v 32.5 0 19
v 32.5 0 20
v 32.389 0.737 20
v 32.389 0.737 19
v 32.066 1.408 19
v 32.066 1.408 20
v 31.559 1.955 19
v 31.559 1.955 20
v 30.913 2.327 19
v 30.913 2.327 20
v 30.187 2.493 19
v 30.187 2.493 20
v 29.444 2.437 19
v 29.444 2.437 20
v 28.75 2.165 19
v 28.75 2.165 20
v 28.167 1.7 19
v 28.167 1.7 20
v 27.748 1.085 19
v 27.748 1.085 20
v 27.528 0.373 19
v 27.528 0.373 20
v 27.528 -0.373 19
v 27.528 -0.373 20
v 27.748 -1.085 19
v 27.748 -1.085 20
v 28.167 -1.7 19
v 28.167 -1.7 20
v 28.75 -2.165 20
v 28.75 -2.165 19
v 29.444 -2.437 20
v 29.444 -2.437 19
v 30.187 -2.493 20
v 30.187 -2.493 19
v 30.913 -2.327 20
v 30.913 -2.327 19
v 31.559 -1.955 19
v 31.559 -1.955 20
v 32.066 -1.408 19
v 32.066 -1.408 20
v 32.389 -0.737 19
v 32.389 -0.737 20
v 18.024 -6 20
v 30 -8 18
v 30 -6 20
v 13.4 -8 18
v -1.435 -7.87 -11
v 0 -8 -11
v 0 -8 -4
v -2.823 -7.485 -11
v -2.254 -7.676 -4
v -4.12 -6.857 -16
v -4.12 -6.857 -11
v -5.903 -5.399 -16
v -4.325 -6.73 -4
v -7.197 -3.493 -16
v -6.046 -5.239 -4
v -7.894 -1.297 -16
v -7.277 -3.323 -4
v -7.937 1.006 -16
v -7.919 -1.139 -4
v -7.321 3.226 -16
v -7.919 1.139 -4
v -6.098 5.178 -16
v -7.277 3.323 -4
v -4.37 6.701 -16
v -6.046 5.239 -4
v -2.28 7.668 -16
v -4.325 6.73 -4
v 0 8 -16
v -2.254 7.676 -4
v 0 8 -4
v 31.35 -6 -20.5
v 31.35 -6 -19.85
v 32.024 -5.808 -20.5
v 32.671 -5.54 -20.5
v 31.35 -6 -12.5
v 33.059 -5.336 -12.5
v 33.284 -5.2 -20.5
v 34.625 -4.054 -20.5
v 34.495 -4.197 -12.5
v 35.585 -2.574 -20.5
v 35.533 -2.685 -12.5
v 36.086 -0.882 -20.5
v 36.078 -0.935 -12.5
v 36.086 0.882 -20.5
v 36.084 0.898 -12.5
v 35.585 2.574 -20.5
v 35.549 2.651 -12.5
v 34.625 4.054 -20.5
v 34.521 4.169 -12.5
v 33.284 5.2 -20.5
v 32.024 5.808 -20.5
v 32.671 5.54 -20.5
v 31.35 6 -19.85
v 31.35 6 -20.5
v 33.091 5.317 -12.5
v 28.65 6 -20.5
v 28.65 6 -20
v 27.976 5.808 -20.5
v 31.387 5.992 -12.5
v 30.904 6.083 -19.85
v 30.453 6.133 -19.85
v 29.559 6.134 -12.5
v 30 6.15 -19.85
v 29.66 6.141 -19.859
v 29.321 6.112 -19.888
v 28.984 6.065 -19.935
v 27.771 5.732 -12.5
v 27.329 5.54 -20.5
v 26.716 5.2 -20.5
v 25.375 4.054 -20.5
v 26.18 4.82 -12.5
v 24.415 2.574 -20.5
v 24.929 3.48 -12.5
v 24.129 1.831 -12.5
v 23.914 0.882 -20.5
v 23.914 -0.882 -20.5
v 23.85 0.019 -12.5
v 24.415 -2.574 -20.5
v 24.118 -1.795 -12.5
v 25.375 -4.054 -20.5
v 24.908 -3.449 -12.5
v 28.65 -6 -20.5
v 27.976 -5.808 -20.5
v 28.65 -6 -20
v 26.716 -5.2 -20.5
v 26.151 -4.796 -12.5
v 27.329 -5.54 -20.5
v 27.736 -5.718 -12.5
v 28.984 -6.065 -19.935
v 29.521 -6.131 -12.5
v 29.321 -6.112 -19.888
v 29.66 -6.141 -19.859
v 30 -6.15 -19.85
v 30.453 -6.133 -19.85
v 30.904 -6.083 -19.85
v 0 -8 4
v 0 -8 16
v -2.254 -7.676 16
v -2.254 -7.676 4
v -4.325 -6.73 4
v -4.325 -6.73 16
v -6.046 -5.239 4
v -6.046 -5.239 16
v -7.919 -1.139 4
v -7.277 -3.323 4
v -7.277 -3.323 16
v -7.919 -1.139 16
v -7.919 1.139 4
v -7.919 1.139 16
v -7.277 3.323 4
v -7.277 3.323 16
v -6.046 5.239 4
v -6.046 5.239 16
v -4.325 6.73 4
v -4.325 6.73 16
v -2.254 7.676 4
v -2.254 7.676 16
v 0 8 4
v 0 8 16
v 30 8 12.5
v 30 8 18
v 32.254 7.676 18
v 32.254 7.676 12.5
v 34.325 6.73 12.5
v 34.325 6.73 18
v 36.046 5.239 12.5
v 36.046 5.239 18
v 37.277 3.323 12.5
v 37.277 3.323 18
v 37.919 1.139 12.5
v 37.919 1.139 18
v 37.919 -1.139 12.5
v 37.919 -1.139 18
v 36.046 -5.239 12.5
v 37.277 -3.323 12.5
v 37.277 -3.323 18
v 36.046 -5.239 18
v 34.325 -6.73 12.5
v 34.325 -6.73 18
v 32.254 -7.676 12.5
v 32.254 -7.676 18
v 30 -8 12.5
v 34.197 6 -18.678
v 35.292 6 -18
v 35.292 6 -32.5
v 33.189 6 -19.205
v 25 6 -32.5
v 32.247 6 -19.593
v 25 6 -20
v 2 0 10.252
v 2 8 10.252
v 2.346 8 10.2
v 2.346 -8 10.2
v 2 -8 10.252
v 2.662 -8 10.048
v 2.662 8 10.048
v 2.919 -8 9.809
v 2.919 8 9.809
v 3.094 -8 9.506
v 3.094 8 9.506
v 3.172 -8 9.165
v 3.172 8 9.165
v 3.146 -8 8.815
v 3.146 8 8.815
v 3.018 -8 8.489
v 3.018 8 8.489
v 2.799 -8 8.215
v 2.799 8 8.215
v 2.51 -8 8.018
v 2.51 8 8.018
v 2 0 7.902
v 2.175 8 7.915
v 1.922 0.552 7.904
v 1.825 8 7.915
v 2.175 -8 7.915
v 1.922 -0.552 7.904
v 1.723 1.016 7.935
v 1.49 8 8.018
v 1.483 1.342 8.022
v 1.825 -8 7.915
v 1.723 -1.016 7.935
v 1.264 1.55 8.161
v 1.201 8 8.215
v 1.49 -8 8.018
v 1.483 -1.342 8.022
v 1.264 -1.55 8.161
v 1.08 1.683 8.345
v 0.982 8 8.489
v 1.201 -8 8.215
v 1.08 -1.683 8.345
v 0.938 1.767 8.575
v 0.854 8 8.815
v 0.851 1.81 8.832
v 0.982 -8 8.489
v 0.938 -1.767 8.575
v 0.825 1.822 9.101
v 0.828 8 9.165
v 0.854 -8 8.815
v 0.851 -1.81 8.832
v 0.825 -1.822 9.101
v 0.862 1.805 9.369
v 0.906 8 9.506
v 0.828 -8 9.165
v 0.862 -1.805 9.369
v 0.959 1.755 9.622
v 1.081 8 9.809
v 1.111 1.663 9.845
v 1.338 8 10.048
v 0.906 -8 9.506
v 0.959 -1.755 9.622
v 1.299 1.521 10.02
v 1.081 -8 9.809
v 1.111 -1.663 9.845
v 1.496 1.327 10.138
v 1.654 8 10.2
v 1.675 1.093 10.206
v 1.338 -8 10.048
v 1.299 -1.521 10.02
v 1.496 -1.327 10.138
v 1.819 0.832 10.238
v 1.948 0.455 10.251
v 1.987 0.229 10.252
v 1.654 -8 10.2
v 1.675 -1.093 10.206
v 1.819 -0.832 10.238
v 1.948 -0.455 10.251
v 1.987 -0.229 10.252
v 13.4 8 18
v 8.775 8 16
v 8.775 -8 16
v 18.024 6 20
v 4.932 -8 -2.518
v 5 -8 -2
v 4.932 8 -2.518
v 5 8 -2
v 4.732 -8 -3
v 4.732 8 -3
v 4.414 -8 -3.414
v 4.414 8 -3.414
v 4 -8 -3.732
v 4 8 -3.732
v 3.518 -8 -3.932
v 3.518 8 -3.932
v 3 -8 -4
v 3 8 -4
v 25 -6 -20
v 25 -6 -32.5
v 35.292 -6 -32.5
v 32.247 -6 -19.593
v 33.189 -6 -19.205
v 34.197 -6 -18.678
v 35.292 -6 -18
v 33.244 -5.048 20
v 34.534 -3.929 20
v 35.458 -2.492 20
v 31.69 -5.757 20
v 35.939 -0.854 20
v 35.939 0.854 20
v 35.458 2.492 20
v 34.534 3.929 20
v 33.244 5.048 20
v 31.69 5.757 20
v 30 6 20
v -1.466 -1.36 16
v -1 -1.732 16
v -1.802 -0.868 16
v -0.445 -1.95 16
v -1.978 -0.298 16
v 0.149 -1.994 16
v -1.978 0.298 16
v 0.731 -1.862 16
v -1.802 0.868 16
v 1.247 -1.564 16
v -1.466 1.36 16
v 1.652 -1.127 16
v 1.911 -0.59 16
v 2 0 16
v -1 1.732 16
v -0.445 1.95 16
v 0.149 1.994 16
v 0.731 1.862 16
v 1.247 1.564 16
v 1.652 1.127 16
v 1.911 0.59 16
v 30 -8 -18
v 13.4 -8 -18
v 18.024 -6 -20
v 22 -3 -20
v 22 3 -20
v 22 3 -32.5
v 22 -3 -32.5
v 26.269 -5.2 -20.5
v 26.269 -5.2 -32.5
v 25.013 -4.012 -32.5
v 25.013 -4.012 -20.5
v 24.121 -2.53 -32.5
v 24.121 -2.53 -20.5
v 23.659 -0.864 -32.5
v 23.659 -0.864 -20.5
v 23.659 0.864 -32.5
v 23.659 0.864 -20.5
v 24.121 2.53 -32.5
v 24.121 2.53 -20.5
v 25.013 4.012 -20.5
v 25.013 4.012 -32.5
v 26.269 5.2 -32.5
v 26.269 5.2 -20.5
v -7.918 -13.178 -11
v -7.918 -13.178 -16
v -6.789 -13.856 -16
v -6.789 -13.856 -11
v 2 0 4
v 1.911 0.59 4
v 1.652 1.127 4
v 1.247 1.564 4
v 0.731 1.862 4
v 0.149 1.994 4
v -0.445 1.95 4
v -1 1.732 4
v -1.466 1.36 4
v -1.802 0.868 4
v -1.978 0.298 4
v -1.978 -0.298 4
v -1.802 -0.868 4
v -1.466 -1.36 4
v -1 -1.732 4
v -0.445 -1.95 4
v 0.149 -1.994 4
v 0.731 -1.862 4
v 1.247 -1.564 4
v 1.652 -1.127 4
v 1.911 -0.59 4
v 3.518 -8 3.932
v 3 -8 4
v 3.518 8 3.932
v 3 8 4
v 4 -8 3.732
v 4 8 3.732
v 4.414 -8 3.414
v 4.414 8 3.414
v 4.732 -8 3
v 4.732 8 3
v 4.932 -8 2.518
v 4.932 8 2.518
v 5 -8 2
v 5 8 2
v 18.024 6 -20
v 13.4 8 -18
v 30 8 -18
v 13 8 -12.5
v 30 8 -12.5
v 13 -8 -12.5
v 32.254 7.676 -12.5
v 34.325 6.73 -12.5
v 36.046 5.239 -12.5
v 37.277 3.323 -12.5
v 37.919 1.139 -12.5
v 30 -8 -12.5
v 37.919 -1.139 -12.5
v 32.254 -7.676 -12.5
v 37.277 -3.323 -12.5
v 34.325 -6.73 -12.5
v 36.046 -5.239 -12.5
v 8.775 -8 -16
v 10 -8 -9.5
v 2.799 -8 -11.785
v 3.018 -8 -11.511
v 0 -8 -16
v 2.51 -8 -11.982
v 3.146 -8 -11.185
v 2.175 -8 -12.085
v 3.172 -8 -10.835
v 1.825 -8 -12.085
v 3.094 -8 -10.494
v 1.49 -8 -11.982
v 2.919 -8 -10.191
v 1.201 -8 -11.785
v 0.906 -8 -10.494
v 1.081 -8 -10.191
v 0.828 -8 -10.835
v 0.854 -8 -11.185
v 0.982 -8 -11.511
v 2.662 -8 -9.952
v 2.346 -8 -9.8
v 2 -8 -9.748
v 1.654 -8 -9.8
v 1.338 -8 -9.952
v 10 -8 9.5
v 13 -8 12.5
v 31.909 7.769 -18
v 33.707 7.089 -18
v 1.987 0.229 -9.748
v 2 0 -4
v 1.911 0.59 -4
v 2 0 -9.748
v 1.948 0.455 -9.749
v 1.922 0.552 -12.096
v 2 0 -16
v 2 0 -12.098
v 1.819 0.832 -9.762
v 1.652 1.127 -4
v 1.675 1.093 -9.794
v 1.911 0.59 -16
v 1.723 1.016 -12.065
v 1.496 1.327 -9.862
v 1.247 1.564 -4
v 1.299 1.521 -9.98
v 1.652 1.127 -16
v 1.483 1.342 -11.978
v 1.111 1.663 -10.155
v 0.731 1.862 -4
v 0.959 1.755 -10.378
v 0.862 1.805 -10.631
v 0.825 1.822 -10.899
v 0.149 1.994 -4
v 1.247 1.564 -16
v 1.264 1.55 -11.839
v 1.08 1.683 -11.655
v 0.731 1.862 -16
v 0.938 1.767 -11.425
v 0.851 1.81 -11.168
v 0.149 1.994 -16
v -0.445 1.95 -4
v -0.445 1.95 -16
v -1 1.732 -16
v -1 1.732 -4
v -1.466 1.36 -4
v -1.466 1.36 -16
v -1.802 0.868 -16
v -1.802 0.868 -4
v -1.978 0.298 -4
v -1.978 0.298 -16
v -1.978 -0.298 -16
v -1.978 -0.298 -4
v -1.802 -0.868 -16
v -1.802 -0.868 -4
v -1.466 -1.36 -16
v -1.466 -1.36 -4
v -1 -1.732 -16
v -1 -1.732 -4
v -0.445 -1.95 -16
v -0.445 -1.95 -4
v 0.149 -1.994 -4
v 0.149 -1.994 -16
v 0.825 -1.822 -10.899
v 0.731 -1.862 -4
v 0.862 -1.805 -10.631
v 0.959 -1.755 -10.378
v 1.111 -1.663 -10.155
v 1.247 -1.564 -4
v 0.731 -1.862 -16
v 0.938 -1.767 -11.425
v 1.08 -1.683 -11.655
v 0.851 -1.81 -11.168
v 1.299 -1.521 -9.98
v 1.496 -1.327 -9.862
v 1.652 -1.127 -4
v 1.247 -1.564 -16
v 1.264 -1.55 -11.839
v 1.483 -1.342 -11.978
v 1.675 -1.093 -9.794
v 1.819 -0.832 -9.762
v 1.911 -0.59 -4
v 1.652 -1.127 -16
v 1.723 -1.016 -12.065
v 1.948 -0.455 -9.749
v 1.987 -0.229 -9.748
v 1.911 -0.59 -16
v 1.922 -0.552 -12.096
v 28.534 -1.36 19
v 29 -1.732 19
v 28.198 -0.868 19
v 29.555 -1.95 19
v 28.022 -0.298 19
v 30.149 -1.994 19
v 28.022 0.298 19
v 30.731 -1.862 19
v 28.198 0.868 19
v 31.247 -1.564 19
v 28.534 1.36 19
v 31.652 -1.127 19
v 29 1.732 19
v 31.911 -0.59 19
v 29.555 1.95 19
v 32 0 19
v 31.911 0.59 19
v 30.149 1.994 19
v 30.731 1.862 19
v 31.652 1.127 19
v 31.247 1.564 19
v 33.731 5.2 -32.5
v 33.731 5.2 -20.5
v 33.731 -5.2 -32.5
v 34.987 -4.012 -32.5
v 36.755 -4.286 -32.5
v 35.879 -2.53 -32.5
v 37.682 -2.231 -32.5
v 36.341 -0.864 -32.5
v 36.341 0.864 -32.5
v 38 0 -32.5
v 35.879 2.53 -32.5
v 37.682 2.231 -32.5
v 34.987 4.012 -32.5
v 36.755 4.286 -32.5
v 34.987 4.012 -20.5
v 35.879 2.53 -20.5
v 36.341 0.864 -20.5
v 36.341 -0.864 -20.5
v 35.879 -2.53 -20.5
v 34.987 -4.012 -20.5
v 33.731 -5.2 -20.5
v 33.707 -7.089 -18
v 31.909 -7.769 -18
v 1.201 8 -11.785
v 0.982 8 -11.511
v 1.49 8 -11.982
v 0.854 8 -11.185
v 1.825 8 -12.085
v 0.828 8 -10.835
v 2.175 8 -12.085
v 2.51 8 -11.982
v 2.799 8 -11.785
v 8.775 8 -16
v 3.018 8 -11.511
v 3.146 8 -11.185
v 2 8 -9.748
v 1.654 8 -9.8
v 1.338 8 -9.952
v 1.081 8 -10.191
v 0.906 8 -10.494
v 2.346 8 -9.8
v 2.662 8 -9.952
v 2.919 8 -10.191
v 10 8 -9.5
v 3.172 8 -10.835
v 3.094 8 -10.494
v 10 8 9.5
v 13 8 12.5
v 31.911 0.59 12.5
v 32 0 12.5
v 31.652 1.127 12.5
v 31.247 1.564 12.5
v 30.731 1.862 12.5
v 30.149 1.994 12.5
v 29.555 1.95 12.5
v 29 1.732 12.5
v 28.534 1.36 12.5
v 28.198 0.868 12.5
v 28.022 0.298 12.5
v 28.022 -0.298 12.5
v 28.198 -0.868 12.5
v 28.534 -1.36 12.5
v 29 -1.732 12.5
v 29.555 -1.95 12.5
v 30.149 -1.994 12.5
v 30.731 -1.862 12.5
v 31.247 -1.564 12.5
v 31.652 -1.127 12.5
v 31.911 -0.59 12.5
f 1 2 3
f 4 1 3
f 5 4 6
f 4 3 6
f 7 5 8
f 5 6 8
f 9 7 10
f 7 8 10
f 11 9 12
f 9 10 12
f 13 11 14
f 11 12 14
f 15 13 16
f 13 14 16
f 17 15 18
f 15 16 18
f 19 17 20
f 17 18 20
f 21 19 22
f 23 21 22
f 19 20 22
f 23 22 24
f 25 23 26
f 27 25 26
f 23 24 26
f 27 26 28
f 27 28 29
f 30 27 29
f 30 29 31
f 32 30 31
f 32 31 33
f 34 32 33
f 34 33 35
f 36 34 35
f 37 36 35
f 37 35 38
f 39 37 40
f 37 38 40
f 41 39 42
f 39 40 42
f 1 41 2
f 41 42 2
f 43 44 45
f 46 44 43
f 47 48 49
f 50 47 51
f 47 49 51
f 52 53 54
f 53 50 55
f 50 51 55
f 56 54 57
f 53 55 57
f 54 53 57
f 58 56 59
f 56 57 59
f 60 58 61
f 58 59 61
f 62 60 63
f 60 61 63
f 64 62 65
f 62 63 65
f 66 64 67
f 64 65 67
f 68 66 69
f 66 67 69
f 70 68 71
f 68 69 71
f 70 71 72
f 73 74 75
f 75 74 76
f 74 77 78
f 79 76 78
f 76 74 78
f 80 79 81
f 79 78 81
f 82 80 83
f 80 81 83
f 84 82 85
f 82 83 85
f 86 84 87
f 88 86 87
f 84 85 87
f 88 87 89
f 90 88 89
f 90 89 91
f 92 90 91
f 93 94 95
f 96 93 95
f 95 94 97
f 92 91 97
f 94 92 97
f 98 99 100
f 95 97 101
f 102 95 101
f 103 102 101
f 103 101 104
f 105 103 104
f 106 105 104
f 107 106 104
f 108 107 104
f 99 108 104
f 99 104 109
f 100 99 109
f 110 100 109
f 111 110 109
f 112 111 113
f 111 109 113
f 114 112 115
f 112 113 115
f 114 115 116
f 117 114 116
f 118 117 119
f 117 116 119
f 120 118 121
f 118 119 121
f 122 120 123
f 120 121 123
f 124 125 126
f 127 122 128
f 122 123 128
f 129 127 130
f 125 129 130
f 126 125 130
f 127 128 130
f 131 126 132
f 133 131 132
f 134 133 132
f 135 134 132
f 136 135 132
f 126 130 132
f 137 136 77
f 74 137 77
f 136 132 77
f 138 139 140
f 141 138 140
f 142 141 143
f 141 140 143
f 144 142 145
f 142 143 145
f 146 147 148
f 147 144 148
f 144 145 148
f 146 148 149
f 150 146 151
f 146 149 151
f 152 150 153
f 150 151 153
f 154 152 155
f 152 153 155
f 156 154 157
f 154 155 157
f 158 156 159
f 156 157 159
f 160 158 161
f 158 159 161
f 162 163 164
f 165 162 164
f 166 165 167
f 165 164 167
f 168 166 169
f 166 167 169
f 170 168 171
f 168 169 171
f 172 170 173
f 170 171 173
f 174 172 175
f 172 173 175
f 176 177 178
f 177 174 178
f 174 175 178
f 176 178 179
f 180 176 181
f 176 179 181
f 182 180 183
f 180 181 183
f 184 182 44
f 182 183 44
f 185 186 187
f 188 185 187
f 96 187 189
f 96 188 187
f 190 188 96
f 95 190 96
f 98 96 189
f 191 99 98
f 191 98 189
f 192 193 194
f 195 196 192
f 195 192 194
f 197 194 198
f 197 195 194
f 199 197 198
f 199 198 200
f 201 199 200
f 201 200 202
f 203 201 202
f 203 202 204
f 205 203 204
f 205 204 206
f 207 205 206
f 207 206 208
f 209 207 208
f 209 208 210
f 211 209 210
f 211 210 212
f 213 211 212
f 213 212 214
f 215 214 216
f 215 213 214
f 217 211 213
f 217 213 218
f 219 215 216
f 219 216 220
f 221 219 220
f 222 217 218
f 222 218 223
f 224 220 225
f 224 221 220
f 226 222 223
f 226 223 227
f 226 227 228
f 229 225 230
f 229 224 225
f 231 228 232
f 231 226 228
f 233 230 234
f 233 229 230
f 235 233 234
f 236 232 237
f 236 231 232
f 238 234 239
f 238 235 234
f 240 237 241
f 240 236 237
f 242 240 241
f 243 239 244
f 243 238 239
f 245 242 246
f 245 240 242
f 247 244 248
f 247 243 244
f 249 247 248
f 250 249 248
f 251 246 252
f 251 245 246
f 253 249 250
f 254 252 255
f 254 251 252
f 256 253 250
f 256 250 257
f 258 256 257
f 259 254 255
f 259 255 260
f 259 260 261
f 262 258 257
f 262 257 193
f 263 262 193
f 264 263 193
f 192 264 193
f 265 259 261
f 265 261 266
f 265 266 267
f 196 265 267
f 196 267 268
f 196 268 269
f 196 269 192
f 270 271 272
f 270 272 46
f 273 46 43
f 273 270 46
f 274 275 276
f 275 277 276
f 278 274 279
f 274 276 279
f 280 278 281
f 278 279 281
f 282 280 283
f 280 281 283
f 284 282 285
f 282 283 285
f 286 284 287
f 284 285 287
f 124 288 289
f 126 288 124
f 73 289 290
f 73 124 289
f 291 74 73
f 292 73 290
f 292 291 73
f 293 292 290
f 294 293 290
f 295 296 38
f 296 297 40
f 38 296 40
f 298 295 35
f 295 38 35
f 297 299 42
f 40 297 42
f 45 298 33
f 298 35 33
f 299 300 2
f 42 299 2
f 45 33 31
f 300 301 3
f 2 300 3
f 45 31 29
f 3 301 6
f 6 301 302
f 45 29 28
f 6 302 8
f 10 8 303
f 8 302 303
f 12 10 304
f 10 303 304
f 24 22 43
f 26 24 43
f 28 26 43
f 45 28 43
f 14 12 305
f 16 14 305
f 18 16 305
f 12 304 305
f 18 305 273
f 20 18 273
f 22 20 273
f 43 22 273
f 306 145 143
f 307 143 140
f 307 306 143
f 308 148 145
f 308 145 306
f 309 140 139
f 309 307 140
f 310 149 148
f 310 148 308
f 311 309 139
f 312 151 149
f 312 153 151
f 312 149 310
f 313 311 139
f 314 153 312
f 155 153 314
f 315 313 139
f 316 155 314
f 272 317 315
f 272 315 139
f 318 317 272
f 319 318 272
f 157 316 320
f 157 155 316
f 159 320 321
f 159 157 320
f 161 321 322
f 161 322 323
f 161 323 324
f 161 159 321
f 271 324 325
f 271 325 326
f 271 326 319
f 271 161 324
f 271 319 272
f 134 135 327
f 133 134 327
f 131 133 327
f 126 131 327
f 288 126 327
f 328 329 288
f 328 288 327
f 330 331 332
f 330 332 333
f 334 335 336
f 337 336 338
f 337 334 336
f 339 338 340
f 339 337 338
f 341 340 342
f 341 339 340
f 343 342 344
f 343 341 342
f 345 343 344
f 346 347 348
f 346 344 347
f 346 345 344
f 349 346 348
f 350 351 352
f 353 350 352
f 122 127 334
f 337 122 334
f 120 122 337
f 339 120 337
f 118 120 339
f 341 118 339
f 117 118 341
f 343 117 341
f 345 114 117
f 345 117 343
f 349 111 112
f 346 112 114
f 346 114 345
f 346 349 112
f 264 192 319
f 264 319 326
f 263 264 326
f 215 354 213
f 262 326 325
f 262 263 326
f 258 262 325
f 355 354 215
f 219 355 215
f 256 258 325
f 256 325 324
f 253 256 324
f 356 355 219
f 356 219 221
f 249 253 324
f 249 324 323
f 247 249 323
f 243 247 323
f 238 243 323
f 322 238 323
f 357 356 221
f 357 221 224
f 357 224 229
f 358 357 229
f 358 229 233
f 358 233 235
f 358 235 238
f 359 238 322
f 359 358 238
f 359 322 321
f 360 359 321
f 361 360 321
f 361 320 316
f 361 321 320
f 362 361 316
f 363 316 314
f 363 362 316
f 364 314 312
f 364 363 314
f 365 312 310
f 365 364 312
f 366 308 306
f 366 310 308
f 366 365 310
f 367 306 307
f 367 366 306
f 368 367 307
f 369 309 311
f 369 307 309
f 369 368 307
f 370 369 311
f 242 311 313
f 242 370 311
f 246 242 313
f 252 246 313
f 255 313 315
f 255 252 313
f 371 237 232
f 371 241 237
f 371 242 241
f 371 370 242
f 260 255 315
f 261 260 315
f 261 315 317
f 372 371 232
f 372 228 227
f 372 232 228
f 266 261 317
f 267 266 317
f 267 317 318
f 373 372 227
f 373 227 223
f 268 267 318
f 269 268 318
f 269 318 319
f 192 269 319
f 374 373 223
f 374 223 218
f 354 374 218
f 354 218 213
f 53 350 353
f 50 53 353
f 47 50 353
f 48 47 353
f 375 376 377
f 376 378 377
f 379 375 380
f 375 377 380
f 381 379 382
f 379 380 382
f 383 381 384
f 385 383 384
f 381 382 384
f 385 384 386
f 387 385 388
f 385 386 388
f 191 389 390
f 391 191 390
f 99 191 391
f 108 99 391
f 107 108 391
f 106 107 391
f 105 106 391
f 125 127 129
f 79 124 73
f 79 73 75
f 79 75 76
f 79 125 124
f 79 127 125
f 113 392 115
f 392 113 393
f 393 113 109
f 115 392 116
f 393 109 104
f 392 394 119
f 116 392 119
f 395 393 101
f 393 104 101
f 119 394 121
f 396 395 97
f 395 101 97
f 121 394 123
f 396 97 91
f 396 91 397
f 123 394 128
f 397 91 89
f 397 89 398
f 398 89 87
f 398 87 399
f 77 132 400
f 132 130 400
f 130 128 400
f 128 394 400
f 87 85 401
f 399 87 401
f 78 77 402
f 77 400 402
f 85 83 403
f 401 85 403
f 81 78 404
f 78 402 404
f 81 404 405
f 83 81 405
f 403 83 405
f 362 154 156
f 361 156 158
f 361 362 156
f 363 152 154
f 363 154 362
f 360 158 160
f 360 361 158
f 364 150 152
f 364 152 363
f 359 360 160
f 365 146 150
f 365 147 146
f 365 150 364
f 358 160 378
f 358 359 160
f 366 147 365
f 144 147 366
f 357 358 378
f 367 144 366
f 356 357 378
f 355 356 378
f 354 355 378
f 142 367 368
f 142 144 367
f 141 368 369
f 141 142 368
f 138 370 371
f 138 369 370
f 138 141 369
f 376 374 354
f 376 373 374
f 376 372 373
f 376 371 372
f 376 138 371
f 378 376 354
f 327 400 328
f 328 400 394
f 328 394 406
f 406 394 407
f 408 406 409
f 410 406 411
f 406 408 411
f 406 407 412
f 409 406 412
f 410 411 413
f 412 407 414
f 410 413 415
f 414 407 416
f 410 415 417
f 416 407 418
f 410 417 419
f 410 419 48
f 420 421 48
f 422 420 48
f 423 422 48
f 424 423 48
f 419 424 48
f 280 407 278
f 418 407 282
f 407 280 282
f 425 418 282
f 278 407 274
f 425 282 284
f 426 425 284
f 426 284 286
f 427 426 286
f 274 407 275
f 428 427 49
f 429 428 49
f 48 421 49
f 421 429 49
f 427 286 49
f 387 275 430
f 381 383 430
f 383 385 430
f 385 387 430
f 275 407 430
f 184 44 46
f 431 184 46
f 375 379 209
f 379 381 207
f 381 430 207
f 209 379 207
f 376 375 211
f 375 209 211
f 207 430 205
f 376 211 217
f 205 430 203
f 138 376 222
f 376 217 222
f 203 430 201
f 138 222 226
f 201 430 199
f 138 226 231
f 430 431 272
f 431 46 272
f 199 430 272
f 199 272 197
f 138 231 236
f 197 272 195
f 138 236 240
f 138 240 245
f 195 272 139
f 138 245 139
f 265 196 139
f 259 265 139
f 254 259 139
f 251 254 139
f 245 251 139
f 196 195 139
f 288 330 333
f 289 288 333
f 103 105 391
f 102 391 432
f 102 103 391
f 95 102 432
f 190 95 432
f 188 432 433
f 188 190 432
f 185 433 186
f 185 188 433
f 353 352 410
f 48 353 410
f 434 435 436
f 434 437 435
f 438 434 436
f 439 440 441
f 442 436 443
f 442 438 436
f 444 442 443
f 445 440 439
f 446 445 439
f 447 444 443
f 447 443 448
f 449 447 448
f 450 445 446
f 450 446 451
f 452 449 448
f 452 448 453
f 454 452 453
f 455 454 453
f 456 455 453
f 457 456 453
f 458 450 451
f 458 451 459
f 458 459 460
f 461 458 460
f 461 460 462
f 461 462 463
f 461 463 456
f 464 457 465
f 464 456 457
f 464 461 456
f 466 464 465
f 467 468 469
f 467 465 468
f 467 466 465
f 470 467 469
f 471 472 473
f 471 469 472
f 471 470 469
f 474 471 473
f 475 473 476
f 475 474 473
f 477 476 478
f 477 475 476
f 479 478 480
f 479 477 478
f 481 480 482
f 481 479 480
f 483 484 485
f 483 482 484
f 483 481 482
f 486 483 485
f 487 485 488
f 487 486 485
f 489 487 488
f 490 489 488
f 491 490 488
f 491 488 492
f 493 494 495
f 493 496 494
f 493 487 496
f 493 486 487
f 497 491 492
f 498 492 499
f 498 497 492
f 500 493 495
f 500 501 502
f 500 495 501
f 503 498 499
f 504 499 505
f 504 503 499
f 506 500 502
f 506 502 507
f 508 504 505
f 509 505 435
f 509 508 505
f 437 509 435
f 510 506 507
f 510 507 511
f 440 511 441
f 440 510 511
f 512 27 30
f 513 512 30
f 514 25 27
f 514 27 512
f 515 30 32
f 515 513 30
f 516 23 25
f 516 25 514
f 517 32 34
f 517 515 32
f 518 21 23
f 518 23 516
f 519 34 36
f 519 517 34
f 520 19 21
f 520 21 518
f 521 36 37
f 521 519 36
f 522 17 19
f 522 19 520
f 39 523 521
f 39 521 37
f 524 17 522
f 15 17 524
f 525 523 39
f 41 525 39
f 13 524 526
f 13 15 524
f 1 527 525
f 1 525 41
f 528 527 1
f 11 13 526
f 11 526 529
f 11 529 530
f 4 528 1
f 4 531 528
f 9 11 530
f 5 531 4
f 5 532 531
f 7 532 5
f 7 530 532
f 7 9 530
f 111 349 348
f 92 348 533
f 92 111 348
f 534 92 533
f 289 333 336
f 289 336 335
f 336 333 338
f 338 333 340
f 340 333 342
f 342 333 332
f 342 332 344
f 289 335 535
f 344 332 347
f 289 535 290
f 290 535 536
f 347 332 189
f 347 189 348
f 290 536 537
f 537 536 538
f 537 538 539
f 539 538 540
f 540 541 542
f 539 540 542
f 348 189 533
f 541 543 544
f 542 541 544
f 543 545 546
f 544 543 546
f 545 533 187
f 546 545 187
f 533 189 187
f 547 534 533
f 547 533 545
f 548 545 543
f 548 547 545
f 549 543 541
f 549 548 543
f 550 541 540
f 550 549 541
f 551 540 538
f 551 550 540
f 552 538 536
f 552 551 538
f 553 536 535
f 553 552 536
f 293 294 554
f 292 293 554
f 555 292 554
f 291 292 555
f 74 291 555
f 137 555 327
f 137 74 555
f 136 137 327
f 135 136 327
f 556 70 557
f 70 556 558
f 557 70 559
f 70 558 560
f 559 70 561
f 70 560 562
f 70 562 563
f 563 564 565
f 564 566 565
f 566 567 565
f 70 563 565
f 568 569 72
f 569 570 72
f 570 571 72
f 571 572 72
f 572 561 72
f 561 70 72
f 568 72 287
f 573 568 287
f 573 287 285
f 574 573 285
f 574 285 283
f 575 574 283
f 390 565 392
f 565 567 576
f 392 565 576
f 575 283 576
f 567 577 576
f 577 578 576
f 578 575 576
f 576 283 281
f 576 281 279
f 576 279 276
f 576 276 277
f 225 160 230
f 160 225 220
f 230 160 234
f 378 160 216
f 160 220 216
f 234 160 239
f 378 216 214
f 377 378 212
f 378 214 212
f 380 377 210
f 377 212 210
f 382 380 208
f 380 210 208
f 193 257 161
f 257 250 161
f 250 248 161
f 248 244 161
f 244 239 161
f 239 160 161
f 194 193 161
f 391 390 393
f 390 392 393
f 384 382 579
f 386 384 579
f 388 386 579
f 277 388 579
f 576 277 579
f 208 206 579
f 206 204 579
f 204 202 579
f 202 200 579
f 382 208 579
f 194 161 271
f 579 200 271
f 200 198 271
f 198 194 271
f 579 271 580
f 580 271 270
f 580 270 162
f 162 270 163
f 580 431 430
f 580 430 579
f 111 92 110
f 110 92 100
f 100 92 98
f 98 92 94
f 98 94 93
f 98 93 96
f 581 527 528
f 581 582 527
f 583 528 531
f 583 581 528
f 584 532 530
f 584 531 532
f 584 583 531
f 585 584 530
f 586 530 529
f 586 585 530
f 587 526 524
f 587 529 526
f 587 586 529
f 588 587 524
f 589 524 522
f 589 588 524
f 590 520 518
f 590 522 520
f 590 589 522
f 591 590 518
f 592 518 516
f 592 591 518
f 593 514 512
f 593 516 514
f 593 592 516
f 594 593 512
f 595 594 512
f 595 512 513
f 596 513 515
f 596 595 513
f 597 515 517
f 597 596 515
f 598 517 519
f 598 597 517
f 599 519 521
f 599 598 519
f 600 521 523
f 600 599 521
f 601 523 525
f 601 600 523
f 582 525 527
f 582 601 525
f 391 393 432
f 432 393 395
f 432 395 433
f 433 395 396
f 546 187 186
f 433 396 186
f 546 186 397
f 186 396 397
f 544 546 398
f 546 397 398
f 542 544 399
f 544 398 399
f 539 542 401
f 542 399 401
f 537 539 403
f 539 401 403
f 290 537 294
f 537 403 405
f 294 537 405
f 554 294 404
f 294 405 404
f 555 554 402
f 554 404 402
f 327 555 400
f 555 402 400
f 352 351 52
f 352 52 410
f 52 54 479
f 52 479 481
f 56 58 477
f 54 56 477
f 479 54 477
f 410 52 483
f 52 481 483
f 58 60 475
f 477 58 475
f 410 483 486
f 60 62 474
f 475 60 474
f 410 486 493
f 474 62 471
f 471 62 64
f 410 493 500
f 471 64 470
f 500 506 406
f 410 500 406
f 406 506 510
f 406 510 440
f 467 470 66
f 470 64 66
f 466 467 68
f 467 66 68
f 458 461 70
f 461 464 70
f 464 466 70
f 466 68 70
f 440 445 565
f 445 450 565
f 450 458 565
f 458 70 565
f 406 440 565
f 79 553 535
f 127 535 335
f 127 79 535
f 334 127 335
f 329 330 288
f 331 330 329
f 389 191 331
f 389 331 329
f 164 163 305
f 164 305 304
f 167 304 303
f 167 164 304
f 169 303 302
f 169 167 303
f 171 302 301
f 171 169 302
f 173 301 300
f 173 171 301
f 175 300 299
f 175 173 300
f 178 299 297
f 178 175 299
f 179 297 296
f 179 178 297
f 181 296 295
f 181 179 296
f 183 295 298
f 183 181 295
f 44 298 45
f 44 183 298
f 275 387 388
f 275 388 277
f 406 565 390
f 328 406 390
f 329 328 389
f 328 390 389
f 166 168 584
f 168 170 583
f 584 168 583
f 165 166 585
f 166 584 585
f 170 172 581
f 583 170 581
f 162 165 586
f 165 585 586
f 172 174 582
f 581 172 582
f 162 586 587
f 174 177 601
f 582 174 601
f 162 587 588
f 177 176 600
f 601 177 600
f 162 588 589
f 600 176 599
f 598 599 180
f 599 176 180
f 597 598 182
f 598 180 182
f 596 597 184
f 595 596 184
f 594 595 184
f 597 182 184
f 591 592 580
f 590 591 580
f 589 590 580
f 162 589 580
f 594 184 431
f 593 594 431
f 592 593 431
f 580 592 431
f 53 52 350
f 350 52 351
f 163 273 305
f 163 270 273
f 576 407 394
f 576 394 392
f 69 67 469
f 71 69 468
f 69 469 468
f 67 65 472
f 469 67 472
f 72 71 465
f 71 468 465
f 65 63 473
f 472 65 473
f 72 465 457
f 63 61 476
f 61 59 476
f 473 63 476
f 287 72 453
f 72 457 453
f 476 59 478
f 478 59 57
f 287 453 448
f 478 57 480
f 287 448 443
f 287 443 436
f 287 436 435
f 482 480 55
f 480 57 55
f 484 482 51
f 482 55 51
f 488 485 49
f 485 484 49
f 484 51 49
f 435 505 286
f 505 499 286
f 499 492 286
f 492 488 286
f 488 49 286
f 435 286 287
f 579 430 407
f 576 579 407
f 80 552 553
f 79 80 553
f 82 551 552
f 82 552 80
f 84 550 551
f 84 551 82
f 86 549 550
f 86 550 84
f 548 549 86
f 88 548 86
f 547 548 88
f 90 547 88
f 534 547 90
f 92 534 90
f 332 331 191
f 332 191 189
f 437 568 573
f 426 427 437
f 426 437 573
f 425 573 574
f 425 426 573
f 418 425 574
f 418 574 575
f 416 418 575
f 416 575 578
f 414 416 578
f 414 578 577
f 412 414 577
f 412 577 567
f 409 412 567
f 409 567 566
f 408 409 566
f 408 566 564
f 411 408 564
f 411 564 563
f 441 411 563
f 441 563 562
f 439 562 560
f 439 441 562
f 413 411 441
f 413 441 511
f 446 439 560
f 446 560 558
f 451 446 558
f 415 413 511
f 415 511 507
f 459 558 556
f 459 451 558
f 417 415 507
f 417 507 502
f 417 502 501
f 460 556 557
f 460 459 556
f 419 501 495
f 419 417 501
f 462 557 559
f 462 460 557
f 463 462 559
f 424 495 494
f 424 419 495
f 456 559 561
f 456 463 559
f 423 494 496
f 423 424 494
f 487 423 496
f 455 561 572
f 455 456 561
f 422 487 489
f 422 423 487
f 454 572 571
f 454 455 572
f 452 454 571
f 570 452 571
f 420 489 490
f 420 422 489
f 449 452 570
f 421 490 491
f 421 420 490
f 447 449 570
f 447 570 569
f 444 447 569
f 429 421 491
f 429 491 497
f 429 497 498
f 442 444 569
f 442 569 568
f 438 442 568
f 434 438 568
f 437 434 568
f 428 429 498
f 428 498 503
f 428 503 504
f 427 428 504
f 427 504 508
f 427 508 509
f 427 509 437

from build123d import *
from build123d.topology import SkipClean

# Parameters (mm, degrees)
CROQUIS1_R                 = 2
CROQUIS1_R_2               = 2.000000000000003
SALIENTE_EXTRUIR1_DEPTH    = 20
CORTAR_EXTRUIR1_DEPTH      = 44.68065933568311
CORTAR_EXTRUIR2_DEPTH      = 44.68065933568311
CORTAR_EXTRUIR2_DEPTH_BACK = 44.68065933568311
BOSS_EXTRUDE2_START        = -16
BOSS_EXTRUDE2_DEPTH        = 5
CHAFL_N1_SIZE              = 2
CHAFL_N2_SIZE              = 3
CORTAR_EXTRUIR3_DEPTH      = 46.12195091942049
CORTAR_EXTRUIR3_DEPTH_BACK = 46.12195091942049
CROQUIS4_W                 = 13
CROQUIS4_H                 = 8.000000000000007
BOSS_EXTRUDE1_START        = -12.5
SKETCH4_R                  = 2.000000000000003
BOSS_EXTRUDE1_DEPTH        = 20
CUT_EXTRUDE2_START         = -12.5
SKETCH6_R                  = 6.150000000000001
CUT_EXTRUDE2_DEPTH         = 8
CUT_EXTRUDE1_START         = -20.5
CUT_EXTRUDE1_DEPTH         = 32.38680424515073
CUT_EXTRUDE3_START         = 20
SKETCH7_R                  = 2.500000000000002
CUT_EXTRUDE3_DEPTH         = 1
CHAMFER2_SIZE              = 3
CUT_EXTRUDE4_DEPTH         = 52.88680424515073
CUT_EXTRUDE4_DEPTH_BACK    = 52.88680424515073
SKETCH9_R                  = 1.1750000000000003
FILLET1_R                  = 2


with BuildPart() as part:
    # Croquis1 → Saliente-Extruir1 (new, symmetric)
    with BuildSketch(Plane.XY):
        with BuildLine():
            Line((0, 8), (30, 8))
            ThreePointArc((30, 8), (38, 0), (30, -8))
            Line((30, -8), (0, -8))
            ThreePointArc((0, -8), (-8, 9.8e-16), (0, 8))
        make_face()
        Circle(CROQUIS1_R, mode=Mode.SUBTRACT)
        with Locations((30, 0)):
            Circle(CROQUIS1_R_2, mode=Mode.SUBTRACT)
    extrude(amount=SALIENTE_EXTRUIR1_DEPTH, both=True)

    # Croquis2 → Cortar-Extruir1 (cut, symmetric)
    with BuildSketch(Plane(origin=(0, 0, 0), x_dir=(1, 0, 0), z_dir=(0, 1, 0))):
        Polygon((-8, 16), (8.77460379211011, 16), (18.02448398763881, 20), (-8, 20), align=None)
    cortar_extruir1 = extrude(amount=CORTAR_EXTRUIR1_DEPTH, both=True, mode=Mode.SUBTRACT)

    # Simetría1: Cortar-Extruir1 across plane
    add(cortar_extruir1.mirror(Plane.XY), mode=Mode.SUBTRACT)

    # Croquis3 → Cortar-Extruir2 (cut, two sides: drawn at the far end of the back side and taken through both)
    with BuildSketch(Plane(origin=(0, 0, 0), x_dir=(1, 0, 0), z_dir=(0, 1, 0)).offset(-CORTAR_EXTRUIR2_DEPTH_BACK)):
        Polygon((49.99999999999999, -12.499999999999998), (9.999999999999998, -12.500000000000004), (9.999999999999998, 12.499999999999996), (49.99999999999999, 12.500000000000002), align=None)
    extrude(amount=CORTAR_EXTRUIR2_DEPTH + CORTAR_EXTRUIR2_DEPTH_BACK, mode=Mode.SUBTRACT)

    # Sketch8 → Boss-Extrude2 (add)
    with SkipClean():  # the faces are left unmerged after this step: merging them gives an invalid solid
        with BuildSketch(Plane.XY.offset(BOSS_EXTRUDE2_START)):
            with BuildLine():
                ThreePointArc((-3.7e-16, -2), (-0.5344767521565125, -1.9272609064172463), (-1.0300761498201043, -1.714334601404227))
                Line((-1.0300761498201039, -1.7143346014042276), (-7.918066759935976, -13.177876048443173))
                Line((-7.918066759935977, -13.177876048443173), (-6.789375757901606, -13.856062022616376))
                Line((-6.789375757901606, -13.856062022616376), (0, -8))
                Line((0, -8), (0, -2))
            make_face()
        extrude(amount=BOSS_EXTRUDE2_DEPTH)

    # Chaflán1
    chafl_n1_edges = [part.edges().sort_by_distance(p)[0] for p in [
        (38, -4e-16, 20),
        (24.012241993819405, 8, 20),
        (24.012241993819405, -8, -20),
        (24.012241993819405, 8, -20),
        (24.012241993819405, -8, 20),
        (38, -4e-16, -20),
    ]]
    chamfer(chafl_n1_edges, length=CHAFL_N1_SIZE)

    # Chaflán2
    chafl_n2_edges = [part.edges().sort_by_distance(p)[0] for p in [
        (9.999999999999998, 0, -12.499999999999996),
        (9.999999999999998, 0, 12.500000000000004),
    ]]
    chamfer(chafl_n2_edges, length=CHAFL_N2_SIZE)

    # Croquis4 → Cortar-Extruir3 (cut, two sides: drawn at the far end of the back side and taken through both)
    with SkipClean():  # the faces are left unmerged after this step: merging them gives an invalid solid
        with BuildSketch(Plane(origin=(0, 0, 0), x_dir=(1, 0, 0), z_dir=(0, 1, 0)).offset(-CORTAR_EXTRUIR3_DEPTH_BACK)):
            with Locations((-1.5, 0)):
                Rectangle(CROQUIS4_W, CROQUIS4_H)
        extrude(amount=CORTAR_EXTRUIR3_DEPTH + CORTAR_EXTRUIR3_DEPTH_BACK, mode=Mode.SUBTRACT)

    # Sketch4 → Boss-Extrude1 (add)
    with SkipClean():  # the faces are left unmerged after this step: merging them gives an invalid solid
        with BuildSketch(Plane.XY.offset(BOSS_EXTRUDE1_START)):
            with BuildLine():
                Line((22, 6.000000000000003), (22.000000000000004, -6.000000000000014))
                Line((22.000000000000004, -6.000000000000014), (35.291502622129165, -6.000000000000012))
                ThreePointArc((35.291502622129165, -6.000000000000012), (38, 4.44e-15), (35.29150262212916, 6.000000000000019))
                Line((35.29150262212916, 6.000000000000019), (22, 6.000000000000003))
            make_face()
            with Locations(Location((30, 0, 0), (0, 0, 180))):
                Circle(SKETCH4_R, mode=Mode.SUBTRACT)
        extrude(amount=-BOSS_EXTRUDE1_DEPTH)

    # Sketch6 → Cut-Extrude2 (cut)
    with SkipClean():  # the faces are left unmerged after this step: merging them gives an invalid solid
        with BuildSketch(Plane.XY.offset(CUT_EXTRUDE2_START)):
            with Locations(Location((30, 0, 0), (0, 0, 282.680383492))):
                Circle(SKETCH6_R)
        extrude(amount=-CUT_EXTRUDE2_DEPTH, mode=Mode.SUBTRACT)

    # Sketch5 → Cut-Extrude1 (cut, through all)
    with SkipClean():  # the faces are left unmerged after this step: merging them gives an invalid solid
        with BuildSketch(Plane.XY.offset(CUT_EXTRUDE1_START)):
            with BuildLine():
                Line((26.26904837876446, 5.2), (33.73095162123554, 5.2))
                ThreePointArc((33.73095162123554, 5.2), (36.400000000000006, 7.1e-16), (33.73095162123554, -5.199999999999998))
                Line((33.73095162123554, -5.199999999999998), (26.26904837876446, -5.2))
                ThreePointArc((26.26904837876446, -5.2), (23.59999999999999, 7.8e-16), (26.26904837876446, 5.2))
            make_face()
        extrude(amount=-CUT_EXTRUDE1_DEPTH, mode=Mode.SUBTRACT)

    # Sketch7 → Cut-Extrude3 (cut)
    with SkipClean():  # the faces are left unmerged after this step: merging them gives an invalid solid
        with BuildSketch(Plane.XY.offset(CUT_EXTRUDE3_START)):
            with Locations((30, 0)):
                Circle(SKETCH7_R)
        extrude(amount=-CUT_EXTRUDE3_DEPTH, mode=Mode.SUBTRACT)

    # Chamfer2
    chamfer2_edges = [part.edges().sort_by_distance(p)[0] for p in [
        (22.000000000000004, -6.000000000000014, -26.25),
        (22, 6.000000000000003, -26.25),
    ]]
    chamfer(chamfer2_edges, length=CHAMFER2_SIZE)

    # Sketch9 → Cut-Extrude4 (cut, two sides: drawn at the far end of the back side and taken through both)
    with BuildSketch(Plane(origin=(0, 0, 0), x_dir=(1, 0, 0), z_dir=(0, 1, 0)).offset(-CUT_EXTRUDE4_DEPTH_BACK)):
        with Locations(Location((2, 10.923187610000003, 0), (0, 0, 270))):
            Circle(SKETCH9_R)
        with Locations(Location((2, -9.076812389999997, 0), (0, 0, 270))):
            Circle(SKETCH9_R)
    extrude(amount=CUT_EXTRUDE4_DEPTH + CUT_EXTRUDE4_DEPTH_BACK, mode=Mode.SUBTRACT)

    # Fillet1
    fillet1_edges = [part.edges().sort_by_distance(p)[0] for p in [
        (5, 0, -4.0000000000000036),
        (5, 0, 4.0000000000000036),
    ]]
    fillet(fillet1_edges, radius=FILLET1_R)


solid = part.part
